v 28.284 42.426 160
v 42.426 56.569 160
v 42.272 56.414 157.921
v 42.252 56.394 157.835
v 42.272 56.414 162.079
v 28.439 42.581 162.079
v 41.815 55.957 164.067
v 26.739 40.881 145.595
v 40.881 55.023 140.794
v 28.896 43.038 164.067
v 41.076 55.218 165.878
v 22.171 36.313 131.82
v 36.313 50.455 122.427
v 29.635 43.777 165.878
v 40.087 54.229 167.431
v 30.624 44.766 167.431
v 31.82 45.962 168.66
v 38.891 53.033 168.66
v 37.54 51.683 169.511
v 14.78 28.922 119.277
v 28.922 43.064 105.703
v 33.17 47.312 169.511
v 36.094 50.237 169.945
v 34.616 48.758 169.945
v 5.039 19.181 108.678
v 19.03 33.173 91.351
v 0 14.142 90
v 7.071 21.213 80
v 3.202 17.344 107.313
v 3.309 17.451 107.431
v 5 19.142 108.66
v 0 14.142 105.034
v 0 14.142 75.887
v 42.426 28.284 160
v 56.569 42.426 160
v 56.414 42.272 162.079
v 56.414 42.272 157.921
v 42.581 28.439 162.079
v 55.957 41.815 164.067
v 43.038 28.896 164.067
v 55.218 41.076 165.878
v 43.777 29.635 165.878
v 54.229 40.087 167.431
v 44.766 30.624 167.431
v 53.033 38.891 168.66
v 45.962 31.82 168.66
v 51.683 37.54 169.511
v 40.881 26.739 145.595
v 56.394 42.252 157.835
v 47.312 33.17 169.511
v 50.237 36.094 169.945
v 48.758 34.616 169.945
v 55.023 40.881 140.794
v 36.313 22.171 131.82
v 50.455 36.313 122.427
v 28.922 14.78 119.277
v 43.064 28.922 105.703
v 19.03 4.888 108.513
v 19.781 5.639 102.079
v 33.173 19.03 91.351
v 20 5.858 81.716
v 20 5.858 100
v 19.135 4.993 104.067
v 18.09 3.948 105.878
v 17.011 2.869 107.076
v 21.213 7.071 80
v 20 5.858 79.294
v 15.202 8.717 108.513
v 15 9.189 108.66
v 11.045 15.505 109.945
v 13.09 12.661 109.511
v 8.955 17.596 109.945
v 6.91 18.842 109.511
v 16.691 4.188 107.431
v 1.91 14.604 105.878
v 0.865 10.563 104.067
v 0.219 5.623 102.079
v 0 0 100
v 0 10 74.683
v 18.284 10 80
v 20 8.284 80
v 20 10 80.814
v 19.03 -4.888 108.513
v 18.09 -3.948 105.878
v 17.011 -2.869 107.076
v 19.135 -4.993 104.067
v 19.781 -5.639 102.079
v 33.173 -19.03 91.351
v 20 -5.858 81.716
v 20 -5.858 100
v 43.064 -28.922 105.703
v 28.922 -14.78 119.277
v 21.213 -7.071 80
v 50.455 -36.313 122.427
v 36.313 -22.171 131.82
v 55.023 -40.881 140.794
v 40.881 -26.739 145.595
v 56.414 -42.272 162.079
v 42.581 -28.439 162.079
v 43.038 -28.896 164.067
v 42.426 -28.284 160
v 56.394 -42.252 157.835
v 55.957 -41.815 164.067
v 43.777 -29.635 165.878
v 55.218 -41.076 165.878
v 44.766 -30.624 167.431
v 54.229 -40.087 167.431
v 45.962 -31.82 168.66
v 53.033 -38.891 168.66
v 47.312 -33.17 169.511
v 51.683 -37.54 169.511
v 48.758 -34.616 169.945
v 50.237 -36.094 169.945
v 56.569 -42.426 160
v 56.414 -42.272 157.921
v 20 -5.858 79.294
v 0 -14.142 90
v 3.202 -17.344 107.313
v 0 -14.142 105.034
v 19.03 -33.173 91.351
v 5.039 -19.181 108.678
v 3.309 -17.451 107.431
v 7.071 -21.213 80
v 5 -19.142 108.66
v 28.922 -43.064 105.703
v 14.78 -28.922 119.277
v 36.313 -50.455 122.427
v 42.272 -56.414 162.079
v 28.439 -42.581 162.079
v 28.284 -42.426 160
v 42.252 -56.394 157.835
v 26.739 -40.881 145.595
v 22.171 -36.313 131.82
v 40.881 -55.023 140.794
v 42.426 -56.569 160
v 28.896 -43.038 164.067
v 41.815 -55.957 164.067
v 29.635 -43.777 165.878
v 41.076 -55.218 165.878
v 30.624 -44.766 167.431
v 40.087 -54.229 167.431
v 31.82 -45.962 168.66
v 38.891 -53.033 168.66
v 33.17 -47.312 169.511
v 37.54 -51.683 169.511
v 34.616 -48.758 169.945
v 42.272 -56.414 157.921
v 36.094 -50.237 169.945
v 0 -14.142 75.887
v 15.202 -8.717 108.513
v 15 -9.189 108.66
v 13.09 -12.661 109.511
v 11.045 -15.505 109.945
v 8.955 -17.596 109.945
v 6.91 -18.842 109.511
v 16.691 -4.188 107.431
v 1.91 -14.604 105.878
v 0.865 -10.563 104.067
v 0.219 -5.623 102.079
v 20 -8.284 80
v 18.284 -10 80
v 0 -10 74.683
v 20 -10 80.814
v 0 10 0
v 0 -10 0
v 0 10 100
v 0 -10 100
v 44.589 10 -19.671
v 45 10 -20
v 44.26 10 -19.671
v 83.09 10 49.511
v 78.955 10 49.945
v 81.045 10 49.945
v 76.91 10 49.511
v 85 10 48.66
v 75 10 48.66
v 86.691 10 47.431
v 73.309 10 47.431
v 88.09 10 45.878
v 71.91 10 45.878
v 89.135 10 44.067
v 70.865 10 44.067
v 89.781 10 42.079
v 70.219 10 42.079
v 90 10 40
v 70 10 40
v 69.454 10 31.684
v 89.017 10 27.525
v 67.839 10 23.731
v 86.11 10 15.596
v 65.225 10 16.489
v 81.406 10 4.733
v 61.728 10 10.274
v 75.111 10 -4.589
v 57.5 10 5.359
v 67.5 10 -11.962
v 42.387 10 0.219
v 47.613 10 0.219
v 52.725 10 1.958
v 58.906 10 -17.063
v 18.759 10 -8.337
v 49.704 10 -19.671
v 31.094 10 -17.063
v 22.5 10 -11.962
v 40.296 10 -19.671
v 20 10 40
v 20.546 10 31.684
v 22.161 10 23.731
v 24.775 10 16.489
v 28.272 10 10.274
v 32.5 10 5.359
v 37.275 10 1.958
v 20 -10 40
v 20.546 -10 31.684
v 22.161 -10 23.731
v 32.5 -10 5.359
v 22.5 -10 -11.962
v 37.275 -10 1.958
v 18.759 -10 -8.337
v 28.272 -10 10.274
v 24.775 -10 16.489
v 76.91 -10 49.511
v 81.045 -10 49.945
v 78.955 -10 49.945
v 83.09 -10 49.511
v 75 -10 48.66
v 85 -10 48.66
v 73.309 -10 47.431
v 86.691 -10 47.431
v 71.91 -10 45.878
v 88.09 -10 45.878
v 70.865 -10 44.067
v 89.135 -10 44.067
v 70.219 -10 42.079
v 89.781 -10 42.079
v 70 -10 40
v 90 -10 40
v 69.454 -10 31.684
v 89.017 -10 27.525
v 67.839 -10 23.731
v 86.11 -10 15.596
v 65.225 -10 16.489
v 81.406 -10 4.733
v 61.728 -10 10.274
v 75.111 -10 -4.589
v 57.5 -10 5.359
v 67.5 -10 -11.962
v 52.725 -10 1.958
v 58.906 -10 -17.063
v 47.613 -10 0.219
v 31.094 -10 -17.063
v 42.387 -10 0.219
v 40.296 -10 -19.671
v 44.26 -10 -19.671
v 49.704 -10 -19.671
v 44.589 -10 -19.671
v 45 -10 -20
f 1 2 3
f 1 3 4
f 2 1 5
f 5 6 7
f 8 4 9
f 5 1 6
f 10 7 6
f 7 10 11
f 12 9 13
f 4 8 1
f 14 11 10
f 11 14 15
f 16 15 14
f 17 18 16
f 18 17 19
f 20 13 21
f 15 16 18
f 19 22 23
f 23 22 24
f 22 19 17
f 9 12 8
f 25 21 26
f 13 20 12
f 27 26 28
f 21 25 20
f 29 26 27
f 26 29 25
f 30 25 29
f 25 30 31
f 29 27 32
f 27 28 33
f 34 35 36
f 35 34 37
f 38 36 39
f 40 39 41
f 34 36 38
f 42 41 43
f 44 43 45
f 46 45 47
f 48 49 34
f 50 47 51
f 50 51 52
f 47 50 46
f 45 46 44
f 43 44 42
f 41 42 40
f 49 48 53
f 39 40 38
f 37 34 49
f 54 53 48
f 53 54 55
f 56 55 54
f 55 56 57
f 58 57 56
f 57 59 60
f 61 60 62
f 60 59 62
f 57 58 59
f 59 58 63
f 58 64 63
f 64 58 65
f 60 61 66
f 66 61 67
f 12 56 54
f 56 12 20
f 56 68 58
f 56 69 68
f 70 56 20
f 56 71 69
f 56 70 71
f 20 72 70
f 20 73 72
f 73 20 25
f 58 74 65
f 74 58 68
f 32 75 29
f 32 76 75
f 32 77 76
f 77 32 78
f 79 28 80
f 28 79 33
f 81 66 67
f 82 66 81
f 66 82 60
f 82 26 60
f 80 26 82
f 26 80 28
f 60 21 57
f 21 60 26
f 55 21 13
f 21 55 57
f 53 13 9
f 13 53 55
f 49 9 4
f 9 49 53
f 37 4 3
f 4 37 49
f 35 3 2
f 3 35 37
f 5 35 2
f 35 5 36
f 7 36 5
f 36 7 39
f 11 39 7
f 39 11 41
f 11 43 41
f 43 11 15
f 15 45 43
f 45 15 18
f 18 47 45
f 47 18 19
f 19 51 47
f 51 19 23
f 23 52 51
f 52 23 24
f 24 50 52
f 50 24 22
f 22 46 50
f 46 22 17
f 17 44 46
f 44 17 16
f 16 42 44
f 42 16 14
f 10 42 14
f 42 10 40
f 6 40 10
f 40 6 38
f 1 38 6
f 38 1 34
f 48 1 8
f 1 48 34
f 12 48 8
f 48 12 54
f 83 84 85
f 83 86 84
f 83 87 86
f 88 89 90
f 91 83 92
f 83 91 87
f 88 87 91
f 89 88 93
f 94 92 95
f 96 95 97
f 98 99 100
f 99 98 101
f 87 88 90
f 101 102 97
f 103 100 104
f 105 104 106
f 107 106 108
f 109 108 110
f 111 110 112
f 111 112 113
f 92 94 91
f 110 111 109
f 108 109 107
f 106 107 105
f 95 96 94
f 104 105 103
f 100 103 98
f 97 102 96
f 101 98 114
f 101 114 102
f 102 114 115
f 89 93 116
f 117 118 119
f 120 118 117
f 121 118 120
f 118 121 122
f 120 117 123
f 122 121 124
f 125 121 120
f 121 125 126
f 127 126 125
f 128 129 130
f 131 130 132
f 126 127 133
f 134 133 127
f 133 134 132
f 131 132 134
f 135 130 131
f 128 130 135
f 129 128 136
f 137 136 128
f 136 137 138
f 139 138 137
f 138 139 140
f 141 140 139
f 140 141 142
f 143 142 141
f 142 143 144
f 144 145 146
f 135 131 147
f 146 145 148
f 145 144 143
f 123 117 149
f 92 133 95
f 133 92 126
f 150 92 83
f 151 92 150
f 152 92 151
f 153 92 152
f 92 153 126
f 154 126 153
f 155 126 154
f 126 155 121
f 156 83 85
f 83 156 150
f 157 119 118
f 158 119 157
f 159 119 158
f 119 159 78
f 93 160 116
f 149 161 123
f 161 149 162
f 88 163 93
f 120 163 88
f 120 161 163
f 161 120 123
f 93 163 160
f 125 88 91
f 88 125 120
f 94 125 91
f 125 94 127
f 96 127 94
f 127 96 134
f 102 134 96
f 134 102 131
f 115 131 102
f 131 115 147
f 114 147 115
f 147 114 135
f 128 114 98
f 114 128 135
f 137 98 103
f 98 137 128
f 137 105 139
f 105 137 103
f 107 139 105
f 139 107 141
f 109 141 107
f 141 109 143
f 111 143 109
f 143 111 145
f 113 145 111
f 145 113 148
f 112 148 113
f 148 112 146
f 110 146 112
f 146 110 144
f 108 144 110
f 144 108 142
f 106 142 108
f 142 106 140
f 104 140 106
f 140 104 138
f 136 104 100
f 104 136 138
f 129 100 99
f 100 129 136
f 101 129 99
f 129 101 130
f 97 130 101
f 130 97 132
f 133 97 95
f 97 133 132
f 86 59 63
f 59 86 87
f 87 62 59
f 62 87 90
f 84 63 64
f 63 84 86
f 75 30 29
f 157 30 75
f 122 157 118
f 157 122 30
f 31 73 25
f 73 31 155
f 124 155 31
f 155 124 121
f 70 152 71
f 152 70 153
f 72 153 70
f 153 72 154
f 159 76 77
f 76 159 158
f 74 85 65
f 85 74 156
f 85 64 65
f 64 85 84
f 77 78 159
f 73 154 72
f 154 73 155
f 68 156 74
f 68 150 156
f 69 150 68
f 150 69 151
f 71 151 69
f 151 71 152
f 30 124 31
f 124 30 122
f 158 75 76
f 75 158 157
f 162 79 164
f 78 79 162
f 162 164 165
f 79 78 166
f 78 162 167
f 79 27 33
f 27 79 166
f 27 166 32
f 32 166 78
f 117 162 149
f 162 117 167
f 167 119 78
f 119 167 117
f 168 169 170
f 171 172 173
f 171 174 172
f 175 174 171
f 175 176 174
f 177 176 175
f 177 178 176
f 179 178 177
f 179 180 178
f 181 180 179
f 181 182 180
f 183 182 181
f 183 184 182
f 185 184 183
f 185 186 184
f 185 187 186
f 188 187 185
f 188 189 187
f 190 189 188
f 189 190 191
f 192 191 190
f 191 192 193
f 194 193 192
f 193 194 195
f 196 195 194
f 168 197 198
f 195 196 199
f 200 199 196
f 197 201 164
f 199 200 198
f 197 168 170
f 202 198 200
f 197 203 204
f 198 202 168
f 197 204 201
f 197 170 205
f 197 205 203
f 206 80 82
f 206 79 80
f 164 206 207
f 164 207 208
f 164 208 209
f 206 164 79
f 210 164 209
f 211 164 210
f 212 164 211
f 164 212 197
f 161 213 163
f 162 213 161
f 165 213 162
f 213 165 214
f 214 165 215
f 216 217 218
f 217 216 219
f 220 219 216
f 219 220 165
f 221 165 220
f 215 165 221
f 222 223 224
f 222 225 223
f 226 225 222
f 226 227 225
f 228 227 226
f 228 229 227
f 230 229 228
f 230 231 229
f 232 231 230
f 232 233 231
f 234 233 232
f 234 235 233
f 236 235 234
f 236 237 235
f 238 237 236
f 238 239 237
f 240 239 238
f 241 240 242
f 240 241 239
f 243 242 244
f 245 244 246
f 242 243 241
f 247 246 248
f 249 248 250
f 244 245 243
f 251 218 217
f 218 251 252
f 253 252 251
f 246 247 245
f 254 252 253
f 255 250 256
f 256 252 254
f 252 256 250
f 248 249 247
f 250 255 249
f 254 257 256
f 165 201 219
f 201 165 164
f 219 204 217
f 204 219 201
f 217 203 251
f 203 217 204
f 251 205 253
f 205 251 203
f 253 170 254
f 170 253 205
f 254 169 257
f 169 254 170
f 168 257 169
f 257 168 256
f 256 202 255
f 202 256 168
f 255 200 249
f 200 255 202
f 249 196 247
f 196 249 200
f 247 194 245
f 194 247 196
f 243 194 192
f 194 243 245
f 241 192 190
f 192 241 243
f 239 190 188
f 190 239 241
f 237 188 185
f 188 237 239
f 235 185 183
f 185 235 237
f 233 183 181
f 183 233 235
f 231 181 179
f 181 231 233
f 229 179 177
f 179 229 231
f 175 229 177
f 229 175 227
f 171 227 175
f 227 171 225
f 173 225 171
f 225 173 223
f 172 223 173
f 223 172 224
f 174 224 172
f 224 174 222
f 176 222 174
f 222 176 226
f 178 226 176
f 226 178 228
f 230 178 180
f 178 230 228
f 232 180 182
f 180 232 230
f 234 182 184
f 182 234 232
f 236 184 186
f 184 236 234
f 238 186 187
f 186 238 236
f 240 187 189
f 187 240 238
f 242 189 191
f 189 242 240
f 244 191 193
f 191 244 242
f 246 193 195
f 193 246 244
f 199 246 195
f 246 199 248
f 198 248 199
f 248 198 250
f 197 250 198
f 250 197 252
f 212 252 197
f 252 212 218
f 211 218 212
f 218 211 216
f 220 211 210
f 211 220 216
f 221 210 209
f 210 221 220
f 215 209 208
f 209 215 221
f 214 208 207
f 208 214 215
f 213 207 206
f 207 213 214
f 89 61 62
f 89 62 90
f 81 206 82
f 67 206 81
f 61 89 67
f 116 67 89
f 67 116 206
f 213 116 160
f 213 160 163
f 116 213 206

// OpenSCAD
//
//  Copyright (C) 15-2-2013 Jasper den Ouden.
//
//  This is free software: you can redistribute it and/or modify
//  it under the terms of the GNU General Public License as published
//  by the Free Software Foundation, either version 3 of the License, or
//  (at your option) any later version.
//

// NOTE/TODO
// * under hooks probably not printable on its back(horns do slightly better)
// * very square..
// * lay it flat on the back in the first place.

//Very square-ish hook coat hanger.

h=100;
t=20;
d=50;
dh = 60;
a=45;

module upper_catch()
{
    difference()
    {
        intersection()
        {   square([d+t,h+dh]);
            translate([t-d,h+dh]) scale([1,(dh+t)/(sqrt(3)*d)]) circle(2*d);
        }
        translate([-d,h+dh]) scale([1,dh/(sqrt(3)*d)]) circle(2*d);
    }
    translate([d+t/2,h+dh]) circle(t/2);
}

module lower_catch()
{   translate([0,-t]) 
    {   difference() 
        {   intersection()
            {   square([d+2*t,dh]);
                translate([t+d/2,dh]) scale([(d/2+t)/dh,1]) circle(dh);
            }
            translate([t+d/2,dh]) scale([d/(2*(dh-t)),1]) circle(dh-t);
        }
        polygon([[0,t], [t,t], [t+d/2,0]]);
    }
    square([t,dh]);
    translate([d+1.5*t,dh-t]) circle(t/2);
}

module flat_hook2d()
{   square([t,h]);
    upper_catch();
    lower_catch();
}

module flat_hook()
{   linear_extrude(height=t) flat_hook2d(); }

module two_nose_hook()
{
    //TODO bull hook but two lower catches instead.
}

module bull_hook()
{ 
    translate([0,0,-t/2]) linear_extrude(height=t)
    {
        square([t,h]);
        lower_catch();
    }
    
    difference()
    {   union()
        {   translate([0,h]) rotate(a=a, v=[0,1]) translate([0,-h,-t/2])
                linear_extrude(height=t) upper_catch();
            translate([0,h]) rotate(a=-a, v=[0,1]) translate([0,-h,-t/2])
                linear_extrude(height=t) upper_catch();
            translate([t/2,h,-t]) cylinder(r=t/2,h=2*t);
        }
        translate([-4*h,0,0]) cube(8*h*[1,1,1], center=true);
        //Bit ugly way to get rid of cylinder bits.
        rotate(v=[0,1,0], a=a) translate([-4*h-t/2,0,0]) cube(8*h*[1,1,1], center=true);
        rotate(v=[0,1,0], a=-a) translate([-4*h-t/2,0,0]) cube(8*h*[1,1,1], center=true);
    }
}

rotate(v=[1,0,0], a=90) bull_hook();
